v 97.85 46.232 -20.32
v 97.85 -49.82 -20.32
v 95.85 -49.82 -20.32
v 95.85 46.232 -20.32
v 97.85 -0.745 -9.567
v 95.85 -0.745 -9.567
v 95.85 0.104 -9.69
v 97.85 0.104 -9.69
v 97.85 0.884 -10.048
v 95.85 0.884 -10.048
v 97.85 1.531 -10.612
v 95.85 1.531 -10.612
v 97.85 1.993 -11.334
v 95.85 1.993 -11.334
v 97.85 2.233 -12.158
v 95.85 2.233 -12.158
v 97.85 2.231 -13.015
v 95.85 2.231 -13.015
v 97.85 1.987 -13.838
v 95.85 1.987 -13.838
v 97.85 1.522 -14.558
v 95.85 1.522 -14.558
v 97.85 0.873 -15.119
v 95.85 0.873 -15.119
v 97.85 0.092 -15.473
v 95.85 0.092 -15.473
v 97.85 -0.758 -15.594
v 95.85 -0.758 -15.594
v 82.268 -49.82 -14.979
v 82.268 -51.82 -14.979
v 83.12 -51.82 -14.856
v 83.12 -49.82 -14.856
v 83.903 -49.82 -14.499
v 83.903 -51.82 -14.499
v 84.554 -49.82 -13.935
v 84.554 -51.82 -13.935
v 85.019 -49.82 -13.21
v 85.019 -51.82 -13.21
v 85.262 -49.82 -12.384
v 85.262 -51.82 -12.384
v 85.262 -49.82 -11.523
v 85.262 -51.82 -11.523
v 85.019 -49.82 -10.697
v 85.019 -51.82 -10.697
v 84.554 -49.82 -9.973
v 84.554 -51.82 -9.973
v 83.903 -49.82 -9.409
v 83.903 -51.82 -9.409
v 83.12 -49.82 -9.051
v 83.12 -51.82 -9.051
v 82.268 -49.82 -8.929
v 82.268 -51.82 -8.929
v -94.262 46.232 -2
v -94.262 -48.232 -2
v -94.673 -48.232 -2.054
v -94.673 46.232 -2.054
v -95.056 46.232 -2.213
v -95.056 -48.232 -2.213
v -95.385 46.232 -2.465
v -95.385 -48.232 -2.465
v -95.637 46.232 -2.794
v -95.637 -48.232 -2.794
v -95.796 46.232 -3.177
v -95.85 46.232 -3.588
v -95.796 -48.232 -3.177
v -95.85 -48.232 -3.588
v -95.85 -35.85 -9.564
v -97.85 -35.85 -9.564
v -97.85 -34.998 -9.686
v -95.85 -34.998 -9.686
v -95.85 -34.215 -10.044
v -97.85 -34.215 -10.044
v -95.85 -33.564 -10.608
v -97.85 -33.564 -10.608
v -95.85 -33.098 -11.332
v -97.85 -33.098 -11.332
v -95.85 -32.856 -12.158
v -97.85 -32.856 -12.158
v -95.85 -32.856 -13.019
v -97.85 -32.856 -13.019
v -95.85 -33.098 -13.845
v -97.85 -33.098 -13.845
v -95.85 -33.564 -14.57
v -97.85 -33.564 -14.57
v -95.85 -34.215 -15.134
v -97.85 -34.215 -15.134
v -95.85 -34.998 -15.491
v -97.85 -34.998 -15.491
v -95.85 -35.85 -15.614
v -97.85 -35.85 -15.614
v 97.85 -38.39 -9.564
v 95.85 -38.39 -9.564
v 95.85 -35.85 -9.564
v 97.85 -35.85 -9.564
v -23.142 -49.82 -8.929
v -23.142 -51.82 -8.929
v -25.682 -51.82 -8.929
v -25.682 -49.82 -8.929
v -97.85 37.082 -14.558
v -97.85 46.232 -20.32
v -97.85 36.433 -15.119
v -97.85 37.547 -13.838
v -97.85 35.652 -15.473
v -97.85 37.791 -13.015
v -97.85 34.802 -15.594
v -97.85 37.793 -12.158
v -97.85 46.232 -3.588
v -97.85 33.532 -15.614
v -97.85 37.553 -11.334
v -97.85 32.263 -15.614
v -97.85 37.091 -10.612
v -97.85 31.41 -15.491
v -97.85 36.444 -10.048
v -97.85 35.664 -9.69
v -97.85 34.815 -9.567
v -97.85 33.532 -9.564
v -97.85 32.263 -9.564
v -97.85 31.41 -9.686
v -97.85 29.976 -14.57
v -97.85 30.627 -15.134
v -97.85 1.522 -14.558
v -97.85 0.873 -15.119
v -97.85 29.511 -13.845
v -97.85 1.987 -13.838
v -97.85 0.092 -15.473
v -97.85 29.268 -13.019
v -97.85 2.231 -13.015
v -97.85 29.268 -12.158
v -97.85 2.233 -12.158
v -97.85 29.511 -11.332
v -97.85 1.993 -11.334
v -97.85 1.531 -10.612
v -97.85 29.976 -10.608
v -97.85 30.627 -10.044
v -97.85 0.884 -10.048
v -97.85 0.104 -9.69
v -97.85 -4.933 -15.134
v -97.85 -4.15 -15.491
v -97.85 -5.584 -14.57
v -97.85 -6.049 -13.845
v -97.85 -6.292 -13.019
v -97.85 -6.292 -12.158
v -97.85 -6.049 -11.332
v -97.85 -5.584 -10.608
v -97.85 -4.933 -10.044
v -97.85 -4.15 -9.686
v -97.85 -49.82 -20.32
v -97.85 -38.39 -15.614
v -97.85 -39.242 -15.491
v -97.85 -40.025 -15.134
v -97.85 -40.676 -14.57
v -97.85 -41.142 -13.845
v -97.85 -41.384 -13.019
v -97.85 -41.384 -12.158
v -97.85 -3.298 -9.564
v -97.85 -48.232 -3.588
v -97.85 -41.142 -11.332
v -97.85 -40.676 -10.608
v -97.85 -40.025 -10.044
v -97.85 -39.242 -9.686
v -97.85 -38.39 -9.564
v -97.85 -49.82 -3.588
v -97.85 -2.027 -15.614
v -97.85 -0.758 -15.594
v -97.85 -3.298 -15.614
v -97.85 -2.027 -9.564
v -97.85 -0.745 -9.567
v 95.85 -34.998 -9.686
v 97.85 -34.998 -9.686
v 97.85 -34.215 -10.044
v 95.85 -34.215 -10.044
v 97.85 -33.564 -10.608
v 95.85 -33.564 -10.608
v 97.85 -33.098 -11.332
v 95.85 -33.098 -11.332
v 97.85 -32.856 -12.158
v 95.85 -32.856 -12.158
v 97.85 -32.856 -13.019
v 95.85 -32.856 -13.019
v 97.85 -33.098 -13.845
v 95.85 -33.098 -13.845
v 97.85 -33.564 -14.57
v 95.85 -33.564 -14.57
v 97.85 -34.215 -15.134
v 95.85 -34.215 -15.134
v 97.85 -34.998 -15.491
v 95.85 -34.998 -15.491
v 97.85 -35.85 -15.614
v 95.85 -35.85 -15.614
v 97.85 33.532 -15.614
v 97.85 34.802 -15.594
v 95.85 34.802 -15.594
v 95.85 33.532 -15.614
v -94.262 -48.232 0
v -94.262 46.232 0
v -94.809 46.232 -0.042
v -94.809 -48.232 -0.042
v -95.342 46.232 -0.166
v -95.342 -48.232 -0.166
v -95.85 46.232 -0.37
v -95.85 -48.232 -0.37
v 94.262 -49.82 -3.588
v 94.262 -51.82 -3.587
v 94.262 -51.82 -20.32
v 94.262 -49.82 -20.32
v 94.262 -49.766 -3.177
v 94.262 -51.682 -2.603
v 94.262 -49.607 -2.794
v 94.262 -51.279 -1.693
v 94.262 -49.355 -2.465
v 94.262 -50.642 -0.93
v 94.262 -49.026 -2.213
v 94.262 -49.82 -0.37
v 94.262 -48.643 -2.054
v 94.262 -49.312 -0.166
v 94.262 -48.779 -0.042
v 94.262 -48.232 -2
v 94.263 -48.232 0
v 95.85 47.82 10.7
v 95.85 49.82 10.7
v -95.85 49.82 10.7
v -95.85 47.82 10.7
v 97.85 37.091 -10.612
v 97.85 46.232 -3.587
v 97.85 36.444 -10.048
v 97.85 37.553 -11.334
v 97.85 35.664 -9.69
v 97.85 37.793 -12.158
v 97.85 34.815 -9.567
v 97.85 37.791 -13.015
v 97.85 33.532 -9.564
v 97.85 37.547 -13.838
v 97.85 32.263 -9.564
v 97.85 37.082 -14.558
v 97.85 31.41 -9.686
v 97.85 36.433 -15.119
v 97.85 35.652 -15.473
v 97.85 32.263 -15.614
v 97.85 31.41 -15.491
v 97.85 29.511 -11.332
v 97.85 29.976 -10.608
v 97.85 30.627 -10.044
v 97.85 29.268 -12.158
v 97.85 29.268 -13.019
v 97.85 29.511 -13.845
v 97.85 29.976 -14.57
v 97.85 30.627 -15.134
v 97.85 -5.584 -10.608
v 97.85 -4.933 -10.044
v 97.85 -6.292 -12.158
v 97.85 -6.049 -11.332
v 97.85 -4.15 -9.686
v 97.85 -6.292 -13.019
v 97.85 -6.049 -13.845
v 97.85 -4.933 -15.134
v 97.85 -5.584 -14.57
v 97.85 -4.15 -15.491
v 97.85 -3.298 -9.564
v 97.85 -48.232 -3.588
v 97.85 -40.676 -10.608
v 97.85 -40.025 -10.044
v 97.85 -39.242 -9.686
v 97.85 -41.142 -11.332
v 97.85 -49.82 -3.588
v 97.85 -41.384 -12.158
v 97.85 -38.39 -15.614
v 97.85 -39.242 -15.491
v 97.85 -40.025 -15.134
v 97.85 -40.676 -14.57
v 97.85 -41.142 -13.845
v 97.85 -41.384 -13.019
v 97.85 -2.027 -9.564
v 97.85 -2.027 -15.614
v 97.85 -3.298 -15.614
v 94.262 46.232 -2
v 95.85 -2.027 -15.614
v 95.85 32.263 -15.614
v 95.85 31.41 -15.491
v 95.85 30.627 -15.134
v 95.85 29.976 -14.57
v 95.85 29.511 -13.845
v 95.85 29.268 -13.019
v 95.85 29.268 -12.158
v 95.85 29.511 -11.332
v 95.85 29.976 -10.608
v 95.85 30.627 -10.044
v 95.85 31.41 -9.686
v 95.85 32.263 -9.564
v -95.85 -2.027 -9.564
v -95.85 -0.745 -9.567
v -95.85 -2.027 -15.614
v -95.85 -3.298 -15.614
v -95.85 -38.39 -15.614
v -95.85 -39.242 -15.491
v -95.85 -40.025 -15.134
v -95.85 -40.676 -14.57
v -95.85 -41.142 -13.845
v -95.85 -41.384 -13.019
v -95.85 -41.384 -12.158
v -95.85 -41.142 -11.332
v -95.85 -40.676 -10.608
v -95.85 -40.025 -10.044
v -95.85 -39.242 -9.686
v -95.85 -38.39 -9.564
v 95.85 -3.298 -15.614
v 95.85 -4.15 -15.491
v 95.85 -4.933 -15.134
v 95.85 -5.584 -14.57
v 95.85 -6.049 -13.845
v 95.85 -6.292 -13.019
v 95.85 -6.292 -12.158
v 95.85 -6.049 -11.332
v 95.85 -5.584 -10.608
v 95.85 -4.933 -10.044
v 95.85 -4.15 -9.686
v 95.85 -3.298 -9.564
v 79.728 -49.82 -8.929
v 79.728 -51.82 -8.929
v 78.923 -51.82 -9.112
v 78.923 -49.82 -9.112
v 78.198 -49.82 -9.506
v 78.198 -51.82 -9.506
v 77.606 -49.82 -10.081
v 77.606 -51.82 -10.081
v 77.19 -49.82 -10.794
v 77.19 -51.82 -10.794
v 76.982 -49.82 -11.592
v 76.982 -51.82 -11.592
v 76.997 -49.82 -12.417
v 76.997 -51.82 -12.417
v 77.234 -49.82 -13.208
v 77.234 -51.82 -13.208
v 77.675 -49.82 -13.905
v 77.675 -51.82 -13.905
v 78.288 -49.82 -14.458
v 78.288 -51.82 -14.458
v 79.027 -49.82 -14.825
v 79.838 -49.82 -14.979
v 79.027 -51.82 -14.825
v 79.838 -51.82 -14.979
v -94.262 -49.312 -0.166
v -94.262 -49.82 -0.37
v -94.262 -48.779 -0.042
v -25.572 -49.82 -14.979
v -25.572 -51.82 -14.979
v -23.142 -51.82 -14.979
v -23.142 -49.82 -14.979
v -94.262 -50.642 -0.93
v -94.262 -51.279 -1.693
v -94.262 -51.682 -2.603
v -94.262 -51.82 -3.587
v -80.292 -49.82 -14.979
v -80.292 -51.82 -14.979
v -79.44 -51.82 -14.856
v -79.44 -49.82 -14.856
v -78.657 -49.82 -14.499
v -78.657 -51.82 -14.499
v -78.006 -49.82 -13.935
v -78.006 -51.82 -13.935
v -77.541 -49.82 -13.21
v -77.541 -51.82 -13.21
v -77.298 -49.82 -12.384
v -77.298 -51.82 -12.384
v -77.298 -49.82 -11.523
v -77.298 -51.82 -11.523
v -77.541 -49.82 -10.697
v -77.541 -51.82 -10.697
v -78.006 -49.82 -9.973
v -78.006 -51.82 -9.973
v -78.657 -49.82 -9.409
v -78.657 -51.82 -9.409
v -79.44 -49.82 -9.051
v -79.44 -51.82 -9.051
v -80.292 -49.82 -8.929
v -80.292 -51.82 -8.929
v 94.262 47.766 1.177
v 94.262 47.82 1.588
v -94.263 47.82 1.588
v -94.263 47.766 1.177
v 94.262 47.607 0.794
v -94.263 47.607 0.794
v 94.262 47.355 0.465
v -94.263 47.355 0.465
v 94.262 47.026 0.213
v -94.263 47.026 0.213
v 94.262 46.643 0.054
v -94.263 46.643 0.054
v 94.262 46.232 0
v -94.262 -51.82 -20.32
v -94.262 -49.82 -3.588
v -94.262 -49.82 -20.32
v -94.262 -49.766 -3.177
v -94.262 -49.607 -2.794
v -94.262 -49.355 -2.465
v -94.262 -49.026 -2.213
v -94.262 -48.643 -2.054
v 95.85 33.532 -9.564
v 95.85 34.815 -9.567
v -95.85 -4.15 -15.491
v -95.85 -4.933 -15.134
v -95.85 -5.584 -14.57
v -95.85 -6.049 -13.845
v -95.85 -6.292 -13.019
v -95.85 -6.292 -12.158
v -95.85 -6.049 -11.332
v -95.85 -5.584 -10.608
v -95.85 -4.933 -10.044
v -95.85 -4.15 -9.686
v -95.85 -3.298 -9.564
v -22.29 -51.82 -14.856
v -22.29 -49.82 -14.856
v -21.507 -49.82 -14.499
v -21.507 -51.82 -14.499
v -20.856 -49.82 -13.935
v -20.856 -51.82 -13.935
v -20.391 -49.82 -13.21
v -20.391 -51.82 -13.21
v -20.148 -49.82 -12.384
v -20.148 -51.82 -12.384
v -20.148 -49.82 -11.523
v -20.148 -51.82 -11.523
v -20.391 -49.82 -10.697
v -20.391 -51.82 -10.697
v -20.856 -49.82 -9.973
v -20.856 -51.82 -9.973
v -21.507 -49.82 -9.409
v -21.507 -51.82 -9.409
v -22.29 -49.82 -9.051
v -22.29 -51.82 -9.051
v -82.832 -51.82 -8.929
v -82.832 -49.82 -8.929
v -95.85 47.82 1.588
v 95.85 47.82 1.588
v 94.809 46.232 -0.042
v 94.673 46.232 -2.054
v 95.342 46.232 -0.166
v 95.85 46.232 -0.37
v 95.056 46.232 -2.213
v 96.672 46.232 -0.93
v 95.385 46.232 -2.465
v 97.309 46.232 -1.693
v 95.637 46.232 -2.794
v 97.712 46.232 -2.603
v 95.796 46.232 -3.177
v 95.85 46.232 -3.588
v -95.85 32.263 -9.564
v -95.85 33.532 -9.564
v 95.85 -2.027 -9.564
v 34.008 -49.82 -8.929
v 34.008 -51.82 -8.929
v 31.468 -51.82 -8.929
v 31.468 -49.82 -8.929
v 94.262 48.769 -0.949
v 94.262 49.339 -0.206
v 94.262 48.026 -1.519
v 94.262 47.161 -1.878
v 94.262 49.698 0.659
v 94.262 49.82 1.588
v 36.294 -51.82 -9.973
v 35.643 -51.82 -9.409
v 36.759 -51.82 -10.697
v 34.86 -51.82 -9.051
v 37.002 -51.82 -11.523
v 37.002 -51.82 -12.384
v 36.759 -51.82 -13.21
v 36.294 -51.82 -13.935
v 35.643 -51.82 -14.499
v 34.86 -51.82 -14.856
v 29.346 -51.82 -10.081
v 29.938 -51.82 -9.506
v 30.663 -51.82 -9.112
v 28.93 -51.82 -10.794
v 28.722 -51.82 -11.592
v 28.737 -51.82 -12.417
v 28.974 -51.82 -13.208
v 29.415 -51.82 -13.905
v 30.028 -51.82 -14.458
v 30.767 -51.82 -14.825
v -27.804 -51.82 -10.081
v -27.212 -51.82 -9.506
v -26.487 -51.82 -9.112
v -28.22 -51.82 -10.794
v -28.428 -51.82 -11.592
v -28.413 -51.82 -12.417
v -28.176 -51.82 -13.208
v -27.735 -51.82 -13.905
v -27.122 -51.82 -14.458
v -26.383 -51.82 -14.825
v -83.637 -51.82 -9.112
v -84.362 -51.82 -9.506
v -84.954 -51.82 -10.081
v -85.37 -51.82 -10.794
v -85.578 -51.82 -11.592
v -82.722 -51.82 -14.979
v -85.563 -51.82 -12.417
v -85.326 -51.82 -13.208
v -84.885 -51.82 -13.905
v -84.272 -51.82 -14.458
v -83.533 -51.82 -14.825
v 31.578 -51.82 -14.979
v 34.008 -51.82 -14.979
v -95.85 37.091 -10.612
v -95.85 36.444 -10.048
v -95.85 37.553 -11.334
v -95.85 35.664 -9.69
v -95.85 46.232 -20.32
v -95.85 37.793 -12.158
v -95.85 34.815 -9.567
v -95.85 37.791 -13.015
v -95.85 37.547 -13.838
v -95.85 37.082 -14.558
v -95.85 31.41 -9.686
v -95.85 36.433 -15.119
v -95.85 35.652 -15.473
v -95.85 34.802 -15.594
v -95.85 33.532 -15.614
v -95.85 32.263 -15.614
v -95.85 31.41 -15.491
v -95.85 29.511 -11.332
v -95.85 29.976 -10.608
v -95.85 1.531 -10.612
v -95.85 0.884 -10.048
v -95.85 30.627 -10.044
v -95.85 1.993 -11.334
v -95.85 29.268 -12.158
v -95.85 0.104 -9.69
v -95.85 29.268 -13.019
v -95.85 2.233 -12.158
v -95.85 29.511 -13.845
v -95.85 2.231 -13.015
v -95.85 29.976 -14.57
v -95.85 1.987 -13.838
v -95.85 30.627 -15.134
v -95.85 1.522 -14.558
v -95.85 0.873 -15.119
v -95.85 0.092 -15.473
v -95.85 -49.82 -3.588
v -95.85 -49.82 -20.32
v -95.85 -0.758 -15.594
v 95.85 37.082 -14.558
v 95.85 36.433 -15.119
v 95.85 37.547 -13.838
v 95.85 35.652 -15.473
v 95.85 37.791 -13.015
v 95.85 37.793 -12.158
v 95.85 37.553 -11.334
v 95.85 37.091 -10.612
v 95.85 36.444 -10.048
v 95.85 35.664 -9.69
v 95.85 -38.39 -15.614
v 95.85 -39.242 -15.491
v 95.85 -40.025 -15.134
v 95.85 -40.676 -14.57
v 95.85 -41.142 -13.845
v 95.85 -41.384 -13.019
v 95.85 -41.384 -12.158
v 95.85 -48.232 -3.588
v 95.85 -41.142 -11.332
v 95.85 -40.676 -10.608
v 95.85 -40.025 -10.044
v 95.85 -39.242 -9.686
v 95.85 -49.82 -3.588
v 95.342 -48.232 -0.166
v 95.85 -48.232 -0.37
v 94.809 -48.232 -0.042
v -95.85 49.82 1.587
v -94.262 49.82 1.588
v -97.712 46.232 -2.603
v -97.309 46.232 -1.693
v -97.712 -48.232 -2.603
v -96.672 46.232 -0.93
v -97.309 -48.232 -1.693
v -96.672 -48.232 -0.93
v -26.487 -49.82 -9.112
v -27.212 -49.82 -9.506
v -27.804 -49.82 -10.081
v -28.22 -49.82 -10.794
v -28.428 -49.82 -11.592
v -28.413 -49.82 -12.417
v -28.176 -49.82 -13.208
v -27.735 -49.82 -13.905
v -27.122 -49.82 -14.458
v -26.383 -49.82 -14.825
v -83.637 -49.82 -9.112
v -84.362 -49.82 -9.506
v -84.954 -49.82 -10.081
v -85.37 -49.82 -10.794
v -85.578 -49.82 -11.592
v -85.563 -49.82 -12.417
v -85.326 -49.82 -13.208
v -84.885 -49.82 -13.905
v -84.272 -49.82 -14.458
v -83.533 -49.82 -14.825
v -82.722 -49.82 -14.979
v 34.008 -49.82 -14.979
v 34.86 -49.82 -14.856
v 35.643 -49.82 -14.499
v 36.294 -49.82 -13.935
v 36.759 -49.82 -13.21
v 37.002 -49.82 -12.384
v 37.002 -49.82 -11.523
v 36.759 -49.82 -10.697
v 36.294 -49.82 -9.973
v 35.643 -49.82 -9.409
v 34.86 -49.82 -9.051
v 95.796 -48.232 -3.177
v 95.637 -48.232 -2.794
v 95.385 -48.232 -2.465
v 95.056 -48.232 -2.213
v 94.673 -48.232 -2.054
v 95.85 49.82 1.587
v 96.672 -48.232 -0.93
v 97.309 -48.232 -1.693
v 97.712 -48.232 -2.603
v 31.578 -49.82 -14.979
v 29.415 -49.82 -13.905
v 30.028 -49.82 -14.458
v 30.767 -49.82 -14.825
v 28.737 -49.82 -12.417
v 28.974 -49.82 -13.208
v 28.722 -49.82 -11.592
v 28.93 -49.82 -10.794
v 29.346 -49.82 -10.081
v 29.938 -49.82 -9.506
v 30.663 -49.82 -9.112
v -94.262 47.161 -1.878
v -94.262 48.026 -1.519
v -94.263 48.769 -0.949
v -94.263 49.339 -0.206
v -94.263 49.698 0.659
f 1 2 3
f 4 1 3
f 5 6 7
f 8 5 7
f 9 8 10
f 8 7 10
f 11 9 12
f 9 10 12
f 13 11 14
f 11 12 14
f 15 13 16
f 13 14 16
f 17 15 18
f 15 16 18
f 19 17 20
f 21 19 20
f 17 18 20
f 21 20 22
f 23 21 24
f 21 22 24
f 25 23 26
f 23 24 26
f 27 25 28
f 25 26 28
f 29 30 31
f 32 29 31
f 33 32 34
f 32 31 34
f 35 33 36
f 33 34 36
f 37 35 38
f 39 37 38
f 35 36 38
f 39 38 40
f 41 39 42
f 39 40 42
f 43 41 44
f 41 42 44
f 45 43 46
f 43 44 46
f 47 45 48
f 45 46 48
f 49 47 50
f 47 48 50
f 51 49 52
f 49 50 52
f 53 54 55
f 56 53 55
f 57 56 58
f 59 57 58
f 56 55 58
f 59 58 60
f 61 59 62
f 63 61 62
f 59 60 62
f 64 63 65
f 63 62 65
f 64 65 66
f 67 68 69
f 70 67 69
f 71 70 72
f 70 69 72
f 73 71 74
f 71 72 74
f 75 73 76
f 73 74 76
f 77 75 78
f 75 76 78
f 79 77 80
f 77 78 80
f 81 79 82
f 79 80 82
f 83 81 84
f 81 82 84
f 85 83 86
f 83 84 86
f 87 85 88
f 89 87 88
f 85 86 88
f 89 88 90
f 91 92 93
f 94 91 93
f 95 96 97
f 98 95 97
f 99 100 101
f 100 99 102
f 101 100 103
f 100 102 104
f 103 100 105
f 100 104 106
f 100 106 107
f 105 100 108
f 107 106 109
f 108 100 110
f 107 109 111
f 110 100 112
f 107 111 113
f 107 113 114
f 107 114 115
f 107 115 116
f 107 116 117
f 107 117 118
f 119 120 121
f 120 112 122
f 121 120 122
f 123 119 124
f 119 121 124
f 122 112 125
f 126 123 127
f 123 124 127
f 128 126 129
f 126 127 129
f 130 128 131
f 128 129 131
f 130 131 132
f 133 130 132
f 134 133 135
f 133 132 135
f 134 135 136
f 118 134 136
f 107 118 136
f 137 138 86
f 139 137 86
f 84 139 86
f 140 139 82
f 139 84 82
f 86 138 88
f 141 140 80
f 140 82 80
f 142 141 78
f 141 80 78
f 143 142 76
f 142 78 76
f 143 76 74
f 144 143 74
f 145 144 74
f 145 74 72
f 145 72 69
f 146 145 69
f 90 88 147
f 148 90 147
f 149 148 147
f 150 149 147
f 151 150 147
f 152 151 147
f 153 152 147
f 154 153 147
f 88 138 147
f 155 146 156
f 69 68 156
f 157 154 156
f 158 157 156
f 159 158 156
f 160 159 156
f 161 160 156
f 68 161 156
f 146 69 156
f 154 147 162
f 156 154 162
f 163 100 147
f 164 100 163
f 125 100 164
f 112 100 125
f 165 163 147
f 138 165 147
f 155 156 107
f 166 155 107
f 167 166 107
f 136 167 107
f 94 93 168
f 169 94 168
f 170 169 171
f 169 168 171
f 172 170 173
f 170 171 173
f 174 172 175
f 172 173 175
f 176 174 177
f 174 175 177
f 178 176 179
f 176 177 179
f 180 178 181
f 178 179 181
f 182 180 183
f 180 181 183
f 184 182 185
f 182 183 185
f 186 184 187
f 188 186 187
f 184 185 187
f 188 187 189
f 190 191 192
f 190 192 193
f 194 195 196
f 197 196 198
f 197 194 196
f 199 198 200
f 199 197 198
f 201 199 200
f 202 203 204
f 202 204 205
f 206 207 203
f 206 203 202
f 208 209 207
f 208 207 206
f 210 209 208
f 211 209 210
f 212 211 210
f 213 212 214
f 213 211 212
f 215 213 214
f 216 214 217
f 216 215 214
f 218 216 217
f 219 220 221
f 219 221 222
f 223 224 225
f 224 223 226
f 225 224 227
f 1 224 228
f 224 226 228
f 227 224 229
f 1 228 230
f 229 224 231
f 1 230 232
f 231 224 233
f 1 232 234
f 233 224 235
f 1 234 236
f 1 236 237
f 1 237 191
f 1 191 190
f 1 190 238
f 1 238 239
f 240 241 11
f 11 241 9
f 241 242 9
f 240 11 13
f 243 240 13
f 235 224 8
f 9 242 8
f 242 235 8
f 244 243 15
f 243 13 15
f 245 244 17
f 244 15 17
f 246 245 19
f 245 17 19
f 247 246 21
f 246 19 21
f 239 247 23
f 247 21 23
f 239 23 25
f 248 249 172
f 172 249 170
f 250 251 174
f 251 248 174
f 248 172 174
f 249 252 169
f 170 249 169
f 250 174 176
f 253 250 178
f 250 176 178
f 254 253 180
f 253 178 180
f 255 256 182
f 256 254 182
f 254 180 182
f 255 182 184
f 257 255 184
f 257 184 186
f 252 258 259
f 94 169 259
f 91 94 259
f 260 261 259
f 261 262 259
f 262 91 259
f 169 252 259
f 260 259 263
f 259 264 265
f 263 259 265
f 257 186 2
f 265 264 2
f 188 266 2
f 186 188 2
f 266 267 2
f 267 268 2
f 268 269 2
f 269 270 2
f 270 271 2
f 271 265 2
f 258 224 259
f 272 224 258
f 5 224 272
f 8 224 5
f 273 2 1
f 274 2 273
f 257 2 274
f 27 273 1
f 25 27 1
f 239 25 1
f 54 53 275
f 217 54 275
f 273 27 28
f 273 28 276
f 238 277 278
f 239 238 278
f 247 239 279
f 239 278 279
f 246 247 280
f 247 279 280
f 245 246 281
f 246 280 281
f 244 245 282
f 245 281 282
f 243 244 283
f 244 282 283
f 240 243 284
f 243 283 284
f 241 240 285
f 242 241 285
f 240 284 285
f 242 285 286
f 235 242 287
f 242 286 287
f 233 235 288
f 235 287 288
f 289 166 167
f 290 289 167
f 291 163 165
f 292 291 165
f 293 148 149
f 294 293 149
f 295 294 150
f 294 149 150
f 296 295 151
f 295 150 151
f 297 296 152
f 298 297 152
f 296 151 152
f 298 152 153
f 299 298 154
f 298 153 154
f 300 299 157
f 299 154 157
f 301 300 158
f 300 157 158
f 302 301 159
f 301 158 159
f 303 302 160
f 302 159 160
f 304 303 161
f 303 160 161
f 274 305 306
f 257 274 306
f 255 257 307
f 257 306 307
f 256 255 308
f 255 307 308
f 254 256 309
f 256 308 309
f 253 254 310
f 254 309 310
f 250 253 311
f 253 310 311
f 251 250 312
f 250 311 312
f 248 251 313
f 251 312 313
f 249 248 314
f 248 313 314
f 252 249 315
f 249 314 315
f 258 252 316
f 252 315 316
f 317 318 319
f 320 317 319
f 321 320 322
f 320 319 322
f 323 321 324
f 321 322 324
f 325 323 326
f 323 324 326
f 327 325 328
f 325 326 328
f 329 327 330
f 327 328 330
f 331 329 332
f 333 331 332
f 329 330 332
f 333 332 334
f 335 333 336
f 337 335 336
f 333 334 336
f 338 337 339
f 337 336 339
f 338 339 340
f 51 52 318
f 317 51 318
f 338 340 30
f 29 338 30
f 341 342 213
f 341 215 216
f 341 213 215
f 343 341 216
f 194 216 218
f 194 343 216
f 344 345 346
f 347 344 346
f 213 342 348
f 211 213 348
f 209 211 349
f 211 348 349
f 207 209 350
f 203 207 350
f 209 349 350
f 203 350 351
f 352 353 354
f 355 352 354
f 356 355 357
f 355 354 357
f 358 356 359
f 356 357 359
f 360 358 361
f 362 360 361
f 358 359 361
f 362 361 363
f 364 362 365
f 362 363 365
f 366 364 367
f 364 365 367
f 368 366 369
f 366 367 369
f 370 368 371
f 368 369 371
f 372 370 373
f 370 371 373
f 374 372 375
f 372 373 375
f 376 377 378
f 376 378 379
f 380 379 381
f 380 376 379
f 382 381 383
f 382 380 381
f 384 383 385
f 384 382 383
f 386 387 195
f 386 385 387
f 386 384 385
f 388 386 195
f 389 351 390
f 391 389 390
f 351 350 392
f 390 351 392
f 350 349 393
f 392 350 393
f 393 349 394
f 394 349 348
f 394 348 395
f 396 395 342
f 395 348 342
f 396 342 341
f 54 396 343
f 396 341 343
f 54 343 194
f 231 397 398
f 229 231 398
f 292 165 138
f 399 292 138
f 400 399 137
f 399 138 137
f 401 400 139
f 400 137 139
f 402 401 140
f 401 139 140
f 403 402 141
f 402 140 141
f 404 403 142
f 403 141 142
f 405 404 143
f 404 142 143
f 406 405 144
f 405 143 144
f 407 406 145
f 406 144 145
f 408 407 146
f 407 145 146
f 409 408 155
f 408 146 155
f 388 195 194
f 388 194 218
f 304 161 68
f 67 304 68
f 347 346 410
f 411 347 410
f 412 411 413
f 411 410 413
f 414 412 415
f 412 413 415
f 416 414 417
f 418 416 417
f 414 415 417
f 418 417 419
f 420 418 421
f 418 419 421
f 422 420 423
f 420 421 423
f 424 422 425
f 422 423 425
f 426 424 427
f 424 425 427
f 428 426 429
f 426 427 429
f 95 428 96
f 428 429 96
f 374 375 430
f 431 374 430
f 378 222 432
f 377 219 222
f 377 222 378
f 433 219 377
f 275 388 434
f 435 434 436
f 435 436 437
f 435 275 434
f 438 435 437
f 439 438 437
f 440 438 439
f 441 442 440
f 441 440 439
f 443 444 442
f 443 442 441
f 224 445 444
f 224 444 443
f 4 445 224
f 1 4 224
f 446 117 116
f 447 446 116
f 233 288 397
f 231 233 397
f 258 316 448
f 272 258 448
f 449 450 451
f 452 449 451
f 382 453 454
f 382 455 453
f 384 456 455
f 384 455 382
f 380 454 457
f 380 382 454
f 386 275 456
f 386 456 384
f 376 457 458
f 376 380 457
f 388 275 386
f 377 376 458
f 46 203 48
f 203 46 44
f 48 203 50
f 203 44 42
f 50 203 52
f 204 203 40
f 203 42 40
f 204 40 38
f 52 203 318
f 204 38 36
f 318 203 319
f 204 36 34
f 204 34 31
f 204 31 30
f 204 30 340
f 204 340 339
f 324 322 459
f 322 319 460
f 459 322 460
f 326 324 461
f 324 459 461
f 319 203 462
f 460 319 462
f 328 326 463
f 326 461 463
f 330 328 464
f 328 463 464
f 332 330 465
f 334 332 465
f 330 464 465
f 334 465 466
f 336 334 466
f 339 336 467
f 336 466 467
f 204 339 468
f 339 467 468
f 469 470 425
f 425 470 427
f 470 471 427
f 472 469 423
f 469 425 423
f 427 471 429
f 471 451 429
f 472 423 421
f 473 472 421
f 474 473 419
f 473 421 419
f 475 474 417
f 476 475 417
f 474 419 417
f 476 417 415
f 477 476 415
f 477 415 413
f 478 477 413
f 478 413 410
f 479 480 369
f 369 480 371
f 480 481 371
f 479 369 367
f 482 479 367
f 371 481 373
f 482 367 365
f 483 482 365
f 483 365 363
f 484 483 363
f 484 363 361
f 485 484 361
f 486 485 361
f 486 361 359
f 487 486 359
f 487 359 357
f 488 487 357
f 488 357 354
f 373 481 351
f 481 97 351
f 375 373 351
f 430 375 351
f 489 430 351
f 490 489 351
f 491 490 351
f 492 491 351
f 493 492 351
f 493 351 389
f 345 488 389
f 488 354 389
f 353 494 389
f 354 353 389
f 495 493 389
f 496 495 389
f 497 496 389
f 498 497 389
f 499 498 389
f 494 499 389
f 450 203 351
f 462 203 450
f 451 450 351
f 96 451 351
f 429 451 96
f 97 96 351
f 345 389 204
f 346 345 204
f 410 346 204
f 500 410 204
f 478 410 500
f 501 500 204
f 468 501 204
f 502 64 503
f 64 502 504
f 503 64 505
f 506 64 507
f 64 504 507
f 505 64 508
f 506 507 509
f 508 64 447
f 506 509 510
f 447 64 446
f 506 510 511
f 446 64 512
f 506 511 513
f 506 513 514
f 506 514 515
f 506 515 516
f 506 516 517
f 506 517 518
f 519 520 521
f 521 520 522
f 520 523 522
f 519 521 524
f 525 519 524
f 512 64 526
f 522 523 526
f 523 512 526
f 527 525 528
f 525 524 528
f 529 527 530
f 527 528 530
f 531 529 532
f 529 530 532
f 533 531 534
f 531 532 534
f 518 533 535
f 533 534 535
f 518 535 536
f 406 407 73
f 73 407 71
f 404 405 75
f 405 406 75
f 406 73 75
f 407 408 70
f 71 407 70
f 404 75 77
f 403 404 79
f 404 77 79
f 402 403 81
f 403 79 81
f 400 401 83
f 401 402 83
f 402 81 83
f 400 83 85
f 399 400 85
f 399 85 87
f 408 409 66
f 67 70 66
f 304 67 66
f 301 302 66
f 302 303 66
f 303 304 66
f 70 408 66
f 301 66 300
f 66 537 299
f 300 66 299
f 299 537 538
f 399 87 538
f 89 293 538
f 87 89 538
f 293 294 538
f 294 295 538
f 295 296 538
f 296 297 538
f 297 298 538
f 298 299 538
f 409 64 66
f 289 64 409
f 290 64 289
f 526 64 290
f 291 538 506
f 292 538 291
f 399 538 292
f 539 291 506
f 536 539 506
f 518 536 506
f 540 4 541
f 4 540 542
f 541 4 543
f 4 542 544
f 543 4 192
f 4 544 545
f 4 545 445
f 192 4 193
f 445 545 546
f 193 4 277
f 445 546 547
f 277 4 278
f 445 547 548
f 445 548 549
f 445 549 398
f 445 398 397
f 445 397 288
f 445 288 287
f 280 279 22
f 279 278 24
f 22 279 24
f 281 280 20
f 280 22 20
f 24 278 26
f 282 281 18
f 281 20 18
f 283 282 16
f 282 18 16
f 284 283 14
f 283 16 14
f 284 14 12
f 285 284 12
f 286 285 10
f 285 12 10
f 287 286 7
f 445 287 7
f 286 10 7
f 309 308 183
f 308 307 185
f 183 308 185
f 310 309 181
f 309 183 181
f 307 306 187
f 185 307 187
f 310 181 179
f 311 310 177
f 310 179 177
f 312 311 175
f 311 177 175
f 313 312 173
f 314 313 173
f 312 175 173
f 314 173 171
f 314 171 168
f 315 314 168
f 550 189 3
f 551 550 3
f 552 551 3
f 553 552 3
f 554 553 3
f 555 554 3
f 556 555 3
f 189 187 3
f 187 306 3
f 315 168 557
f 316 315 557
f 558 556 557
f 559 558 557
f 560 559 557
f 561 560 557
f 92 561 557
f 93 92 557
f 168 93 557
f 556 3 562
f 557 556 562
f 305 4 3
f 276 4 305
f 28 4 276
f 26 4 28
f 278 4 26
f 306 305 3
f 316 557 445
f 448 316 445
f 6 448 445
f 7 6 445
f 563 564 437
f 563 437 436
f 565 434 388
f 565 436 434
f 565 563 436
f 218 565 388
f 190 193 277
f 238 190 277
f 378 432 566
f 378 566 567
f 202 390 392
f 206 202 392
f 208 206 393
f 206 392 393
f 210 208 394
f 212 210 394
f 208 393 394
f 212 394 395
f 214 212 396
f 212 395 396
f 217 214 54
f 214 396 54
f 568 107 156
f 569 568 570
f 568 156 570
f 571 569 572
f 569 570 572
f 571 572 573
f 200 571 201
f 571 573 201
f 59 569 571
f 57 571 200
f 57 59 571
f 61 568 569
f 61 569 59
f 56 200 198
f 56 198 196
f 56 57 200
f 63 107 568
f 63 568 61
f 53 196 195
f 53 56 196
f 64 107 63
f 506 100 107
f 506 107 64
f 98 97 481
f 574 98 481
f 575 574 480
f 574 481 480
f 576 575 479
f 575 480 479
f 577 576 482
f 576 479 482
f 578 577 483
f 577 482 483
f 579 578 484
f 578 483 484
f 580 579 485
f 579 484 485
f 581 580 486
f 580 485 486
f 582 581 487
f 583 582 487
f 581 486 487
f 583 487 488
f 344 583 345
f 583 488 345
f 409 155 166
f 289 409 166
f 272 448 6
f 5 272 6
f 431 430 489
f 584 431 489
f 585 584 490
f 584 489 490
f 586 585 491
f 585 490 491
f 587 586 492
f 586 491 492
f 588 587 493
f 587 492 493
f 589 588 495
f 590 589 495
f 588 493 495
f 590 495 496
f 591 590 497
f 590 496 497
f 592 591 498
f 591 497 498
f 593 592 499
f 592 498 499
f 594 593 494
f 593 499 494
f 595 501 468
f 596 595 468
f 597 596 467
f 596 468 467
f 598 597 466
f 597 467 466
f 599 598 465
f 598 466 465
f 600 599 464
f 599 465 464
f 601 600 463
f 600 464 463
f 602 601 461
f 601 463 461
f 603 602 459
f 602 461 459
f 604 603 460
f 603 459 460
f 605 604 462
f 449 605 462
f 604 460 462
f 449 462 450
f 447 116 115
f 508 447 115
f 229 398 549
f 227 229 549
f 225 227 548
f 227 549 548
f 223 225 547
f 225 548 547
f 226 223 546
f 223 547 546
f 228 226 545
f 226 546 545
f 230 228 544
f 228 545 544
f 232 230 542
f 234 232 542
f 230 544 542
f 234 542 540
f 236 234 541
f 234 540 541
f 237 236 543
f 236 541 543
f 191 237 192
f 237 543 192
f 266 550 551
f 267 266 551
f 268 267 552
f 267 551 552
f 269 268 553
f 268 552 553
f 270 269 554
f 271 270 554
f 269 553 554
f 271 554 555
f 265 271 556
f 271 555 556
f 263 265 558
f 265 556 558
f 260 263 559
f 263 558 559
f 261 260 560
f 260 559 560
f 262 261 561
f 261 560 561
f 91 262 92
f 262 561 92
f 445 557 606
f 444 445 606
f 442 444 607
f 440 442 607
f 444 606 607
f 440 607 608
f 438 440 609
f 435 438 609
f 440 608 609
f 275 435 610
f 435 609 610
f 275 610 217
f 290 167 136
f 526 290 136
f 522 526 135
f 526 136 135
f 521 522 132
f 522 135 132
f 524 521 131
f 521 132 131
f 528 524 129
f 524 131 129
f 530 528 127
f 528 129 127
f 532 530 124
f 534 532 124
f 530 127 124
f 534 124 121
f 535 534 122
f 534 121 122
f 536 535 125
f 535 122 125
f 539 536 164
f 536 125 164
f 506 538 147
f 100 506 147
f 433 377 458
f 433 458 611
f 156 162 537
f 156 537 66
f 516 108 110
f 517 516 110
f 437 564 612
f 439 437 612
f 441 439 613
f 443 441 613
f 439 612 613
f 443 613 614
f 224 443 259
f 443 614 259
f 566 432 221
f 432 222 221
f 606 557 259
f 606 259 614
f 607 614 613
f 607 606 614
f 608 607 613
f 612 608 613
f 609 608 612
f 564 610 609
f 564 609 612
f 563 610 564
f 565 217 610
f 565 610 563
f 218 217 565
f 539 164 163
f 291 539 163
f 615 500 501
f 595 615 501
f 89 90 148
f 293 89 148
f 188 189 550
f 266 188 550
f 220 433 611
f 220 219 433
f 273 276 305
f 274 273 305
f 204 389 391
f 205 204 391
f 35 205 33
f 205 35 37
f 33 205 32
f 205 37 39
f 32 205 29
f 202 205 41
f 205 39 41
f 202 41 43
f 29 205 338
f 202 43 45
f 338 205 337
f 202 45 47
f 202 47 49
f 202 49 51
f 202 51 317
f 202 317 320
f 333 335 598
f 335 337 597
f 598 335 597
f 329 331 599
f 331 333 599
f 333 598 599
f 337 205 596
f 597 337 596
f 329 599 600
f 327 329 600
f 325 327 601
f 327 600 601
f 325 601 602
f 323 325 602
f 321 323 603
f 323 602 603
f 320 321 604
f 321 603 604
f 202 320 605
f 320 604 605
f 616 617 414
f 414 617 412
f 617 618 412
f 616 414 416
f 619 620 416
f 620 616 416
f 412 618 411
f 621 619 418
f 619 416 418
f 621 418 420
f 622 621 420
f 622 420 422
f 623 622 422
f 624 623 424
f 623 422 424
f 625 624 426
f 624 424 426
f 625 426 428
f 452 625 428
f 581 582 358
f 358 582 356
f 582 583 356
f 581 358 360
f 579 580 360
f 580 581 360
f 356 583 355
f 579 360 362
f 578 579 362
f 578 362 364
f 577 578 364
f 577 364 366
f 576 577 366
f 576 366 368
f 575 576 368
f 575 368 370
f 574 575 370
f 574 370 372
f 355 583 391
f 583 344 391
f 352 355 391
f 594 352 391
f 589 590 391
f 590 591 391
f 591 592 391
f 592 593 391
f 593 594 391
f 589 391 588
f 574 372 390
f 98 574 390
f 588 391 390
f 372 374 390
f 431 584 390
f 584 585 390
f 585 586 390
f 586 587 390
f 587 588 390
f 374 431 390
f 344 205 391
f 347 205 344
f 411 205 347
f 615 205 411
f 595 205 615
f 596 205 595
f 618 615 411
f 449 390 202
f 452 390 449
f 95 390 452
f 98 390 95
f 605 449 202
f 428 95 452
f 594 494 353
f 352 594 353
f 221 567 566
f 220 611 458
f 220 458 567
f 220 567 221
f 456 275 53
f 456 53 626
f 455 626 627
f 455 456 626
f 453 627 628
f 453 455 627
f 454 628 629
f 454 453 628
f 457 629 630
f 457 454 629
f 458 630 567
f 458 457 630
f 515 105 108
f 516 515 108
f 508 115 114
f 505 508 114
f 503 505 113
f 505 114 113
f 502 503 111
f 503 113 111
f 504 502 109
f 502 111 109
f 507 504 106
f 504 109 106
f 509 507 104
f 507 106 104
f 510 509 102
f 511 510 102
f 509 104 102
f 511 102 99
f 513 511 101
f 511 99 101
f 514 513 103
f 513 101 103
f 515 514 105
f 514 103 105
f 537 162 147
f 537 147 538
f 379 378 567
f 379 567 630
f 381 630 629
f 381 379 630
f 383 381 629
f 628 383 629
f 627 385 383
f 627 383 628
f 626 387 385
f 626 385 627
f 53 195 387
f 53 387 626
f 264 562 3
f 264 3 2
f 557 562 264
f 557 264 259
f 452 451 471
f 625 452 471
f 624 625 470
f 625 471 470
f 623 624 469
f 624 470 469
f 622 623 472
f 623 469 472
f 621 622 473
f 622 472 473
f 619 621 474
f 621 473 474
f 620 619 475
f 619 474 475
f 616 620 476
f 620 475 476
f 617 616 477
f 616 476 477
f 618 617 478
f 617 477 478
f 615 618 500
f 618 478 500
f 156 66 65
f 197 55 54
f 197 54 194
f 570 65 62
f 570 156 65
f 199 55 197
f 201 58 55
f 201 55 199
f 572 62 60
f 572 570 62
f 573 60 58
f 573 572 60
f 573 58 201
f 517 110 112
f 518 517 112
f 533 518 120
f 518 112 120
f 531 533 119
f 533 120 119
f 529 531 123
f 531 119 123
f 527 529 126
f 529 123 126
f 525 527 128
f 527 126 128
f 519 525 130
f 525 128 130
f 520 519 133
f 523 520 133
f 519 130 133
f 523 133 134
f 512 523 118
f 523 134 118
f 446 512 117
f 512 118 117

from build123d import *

# Parameters (mm, degrees)
SKETCH1_W                    = 191.7
SKETCH1_H                    = 99.64
BASE_FLANGE4_DEPTH           = 2
EDGE_FLANGE2_STRIP_W         = 11.175
EDGE_FLANGE2_STRIP_H         = 2
EDGE_FLANGE2_STRIP_CUT_DEPTH = 191.7
EDGE_FLANGE2_DEPTH           = 191.7
EDGE_FLANGE1_START           = -49.82
EDGE_FLANGE1_DEPTH           = 99.64
EDGE_FLANGE1_START_2         = 46.2325
EDGE_FLANGE1_2_DEPTH         = 3.5875
EDGE_FLANGE1_3_DEPTH         = 96.0525
EDGE_FLANGE3_START           = -97.85
EDGE_FLANGE3_DEPTH           = 195.7
EDGE_FLANGE3_2_DEPTH         = 3.5875
EDGE_FLANGE3_START_2         = 94.2625
EDGE_FLANGE3_3_DEPTH         = 3.5875
EDGE_FLANGE3_START_3         = -94.2625
EDGE_FLANGE3_4_DEPTH         = 188.525
CUT_EXTRUDE1_DEPTH           = 204.46180182
CUT_EXTRUDE2_DEPTH           = 3.175


# Read off the part's stored shape, not the designer's step: Edge-Flange1, Edge-Flange3
# Sheet-metal steps are written as plain solids
with BuildPart() as part:
    # Sketch1 → Base-Flange4 (new body)
    with BuildSketch(Plane.XY):
        Rectangle(SKETCH1_W, SKETCH1_H)
    extrude(amount=-BASE_FLANGE4_DEPTH)

    # Edge-Flange2 strip (across the edge) → Edge-Flange2 strip cut (cut)
    with BuildSketch(Plane(origin=(95.85, 49.82, 0), x_dir=(0, -1, 0), z_dir=(-1, 0, 0))):
        with Locations((-2, -1)):
            Rectangle(EDGE_FLANGE2_STRIP_W, EDGE_FLANGE2_STRIP_H)
    extrude(amount=EDGE_FLANGE2_STRIP_CUT_DEPTH, mode=Mode.SUBTRACT)

    # Edge-Flange2 section (across the edge) → Edge-Flange2 (add)
    with BuildSketch(Plane(origin=(95.85, 49.82, 0), x_dir=(0, -1, 0), z_dir=(-1, 0, 0))):
        with BuildLine():
            Line((0, 1.5875), (0, 10.7))
            Line((0, 10.7), (2, 10.7))
            Line((2, 10.7), (2, 1.5875))
            ThreePointArc((2, 1.5875), (2.464967985, 0.464967985), (3.5875, 0))
            Line((3.5875, 0), (3.5875, -2))
            ThreePointArc((3.5875, -2), (1.050754422, -0.949245578), (0, 1.5875))
        make_face()
    extrude(amount=EDGE_FLANGE2_DEPTH)

    # Edge-Flange1 outline → Edge-Flange1 (cut)
    with BuildSketch(Plane(origin=(0, 0, 0), x_dir=(1, 0, 0), z_dir=(0, 1, 0)).offset(EDGE_FLANGE1_START)):
        with BuildLine():
            Line((94.2625, -1.5875), (95.85, -1.5875))
            Line((95.85, -1.5875), (95.85, 0.370358411))
            ThreePointArc((95.85, 0.370358411), (95.07756466, 0.093816292), (94.2625, 0))
            Line((94.2625, 0), (94.2625, -1.5875))
        make_face()
        with BuildLine():
            Line((-95.85, 0.370358411), (-95.85, -1.5875))
            Line((-95.85, -1.5875), (-94.2625, -1.5875))
            Line((-94.2625, -1.5875), (-94.2625, 0))
            ThreePointArc((-94.2625, 0), (-95.07756466, 0.093816292), (-95.85, 0.370358411))
        make_face()
    extrude(amount=EDGE_FLANGE1_DEPTH, mode=Mode.SUBTRACT)

    # Edge-Flange1 2 outline → Edge-Flange1 2 (cut)
    with BuildSketch(Plane(origin=(0, 0, 0), x_dir=(1, 0, 0), z_dir=(0, 1, 0)).offset(EDGE_FLANGE1_START_2)):
        with BuildLine():
            Line((94.2625, 2), (94.2625, 0))
            ThreePointArc((94.2625, 0), (95.07756466, 0.093816292), (95.85, 0.370358411))
            ThreePointArc((95.85, 0.370358411), (97.30924519, 1.693430307), (97.85, 3.5875))
            Line((97.85, 3.5875), (97.85, 20.32))
            Line((97.85, 20.32), (95.85, 20.32))
            Line((95.85, 20.32), (95.85, 3.5875))
            ThreePointArc((95.85, 3.5875), (95.385032015, 2.464967985), (94.2625, 2))
        make_face()
        with BuildLine():
            ThreePointArc((-95.85, 0.370358411), (-95.07756466, 0.093816292), (-94.2625, 0))
            Line((-94.2625, 0), (-94.2625, 2))
            ThreePointArc((-94.2625, 2), (-95.385032015, 2.464967985), (-95.85, 3.5875))
            Line((-95.85, 3.5875), (-95.85, 20.32))
            Line((-95.85, 20.32), (-97.85, 20.32))
            Line((-97.85, 20.32), (-97.85, 3.5875))
            ThreePointArc((-97.85, 3.5875), (-97.30924519, 1.693430307), (-95.85, 0.370358411))
        make_face()
    extrude(amount=EDGE_FLANGE1_2_DEPTH, mode=Mode.SUBTRACT)

    # Edge-Flange1 3 outline → Edge-Flange1 3 (add)
    with BuildSketch(Plane(origin=(0, 0, 0), x_dir=(1, 0, 0), z_dir=(0, 1, 0)).offset(EDGE_FLANGE1_START)):
        with BuildLine():
            Line((94.2625, 2), (94.2625, 0))
            ThreePointArc((94.2625, 0), (95.07756466, 0.093816292), (95.85, 0.370358411))
            ThreePointArc((95.85, 0.370358411), (97.30924519, 1.693430307), (97.85, 3.5875))
            Line((97.85, 3.5875), (97.85, 20.32))
            Line((97.85, 20.32), (95.85, 20.32))
            Line((95.85, 20.32), (95.85, 3.5875))
            ThreePointArc((95.85, 3.5875), (95.385032015, 2.464967985), (94.2625, 2))
        make_face()
        with BuildLine():
            ThreePointArc((-95.85, 0.370358411), (-95.07756466, 0.093816292), (-94.2625, 0))
            Line((-94.2625, 0), (-94.2625, 2))
            ThreePointArc((-94.2625, 2), (-95.385032015, 2.464967985), (-95.85, 3.5875))
            Line((-95.85, 3.5875), (-95.85, 20.32))
            Line((-95.85, 20.32), (-97.85, 20.32))
            Line((-97.85, 20.32), (-97.85, 3.5875))
            ThreePointArc((-97.85, 3.5875), (-97.30924519, 1.693430307), (-95.85, 0.370358411))
        make_face()
    extrude(amount=EDGE_FLANGE1_3_DEPTH)

    # Edge-Flange3 outline → Edge-Flange3 (cut)
    with BuildSketch(Plane.YZ.offset(EDGE_FLANGE3_START)):
        with BuildLine():
            ThreePointArc((-48.2325, -2), (-49.355032015, -2.464967985), (-49.82, -3.5875))
            Line((-49.82, -3.5875), (-48.2325, -3.5875))
            Line((-48.2325, -3.5875), (-48.2325, -2))
        make_face()
        with BuildLine():
            ThreePointArc((-49.82, -0.370358411), (-49.04756466, -0.093816292), (-48.2325, 0))
            Line((-48.2325, 0), (-49.82, 0))
            Line((-49.82, 0), (-49.82, -0.370358411))
        make_face()
    extrude(amount=EDGE_FLANGE3_DEPTH, mode=Mode.SUBTRACT)

    # Edge-Flange3 2 outline → Edge-Flange3 2 (cut)
    with BuildSketch(Plane.YZ.offset(EDGE_FLANGE3_START)):
        with BuildLine():
            ThreePointArc((-49.82, -3.5875), (-49.355032015, -2.464967985), (-48.2325, -2))
            Line((-48.2325, -2), (-48.2325, 0))
            ThreePointArc((-48.2325, 0), (-49.04756466, -0.093816292), (-49.82, -0.370358411))
            Line((-49.82, -0.370358411), (-49.82, -3.5875))
        make_face()
    extrude(amount=EDGE_FLANGE3_2_DEPTH, mode=Mode.SUBTRACT)

    # Edge-Flange3 3 outline → Edge-Flange3 3 (cut)
    with BuildSketch(Plane.YZ.offset(EDGE_FLANGE3_START_2)):
        with BuildLine():
            ThreePointArc((-49.82, -3.5875), (-49.355032015, -2.464967985), (-48.2325, -2))
            Line((-48.2325, -2), (-48.2325, 0))
            ThreePointArc((-48.2325, 0), (-49.04756466, -0.093816292), (-49.82, -0.370358411))
            Line((-49.82, -0.370358411), (-49.82, -3.5875))
        make_face()
    extrude(amount=EDGE_FLANGE3_3_DEPTH, mode=Mode.SUBTRACT)

    # Edge-Flange3 4 outline → Edge-Flange3 4 (add)
    with BuildSketch(Plane.YZ.offset(EDGE_FLANGE3_START_3)):
        with BuildLine():
            Line((-48.2325, -2), (-49.82, -2))
            Line((-49.82, -2), (-49.82, -0.370358411))
            ThreePointArc((-49.82, -0.370358411), (-51.27924519, -1.693430307), (-51.82, -3.5875))
            Line((-51.82, -3.5875), (-51.82, -20.32))
            Line((-51.82, -20.32), (-49.82, -20.32))
            Line((-49.82, -20.32), (-49.82, -3.5875))
            ThreePointArc((-49.82, -3.5875), (-49.355032015, -2.464967985), (-48.2325, -2))
        make_face()
    extrude(amount=EDGE_FLANGE3_4_DEPTH)

    # Sketch42 → Cut-Extrude1 (cut, through all)
    with BuildSketch(Plane.ZY.offset(97.85)):
        with BuildLine():
            ThreePointArc((-9.566529979, 34.815400328), (-12.586590694, 37.822400713), (-15.593591079, 34.802339997))
            Line((-15.593591079, 34.802339997), (-15.61375, 33.5325))
            Line((-15.61375, 33.5325), (-15.61375, 32.2625))
            ThreePointArc((-15.61375, 32.2625), (-12.58875, 29.2375), (-9.56375, 32.2625))
            Line((-9.56375, 32.2625), (-9.56375, 33.5325))
            Line((-9.56375, 33.5325), (-9.566529979, 34.815400328))
        make_face()
        with BuildLine():
            Line((-15.61375, -35.85), (-15.61375, -38.39))
            ThreePointArc((-15.61375, -38.39), (-12.58875, -41.415), (-9.56375, -38.39))
            Line((-9.56375, -38.39), (-9.56375, -35.85))
            ThreePointArc((-9.56375, -35.85), (-12.58875, -32.825), (-15.61375, -35.85))
        make_face()
        with BuildLine():
            Line((-9.56375, -3.2975), (-9.56375, -2.0275))
            Line((-9.56375, -2.0275), (-9.566529979, -0.744599672))
            ThreePointArc((-9.566529979, -0.744599672), (-12.586590694, 2.262400713), (-15.593591079, -0.757660003))
            Line((-15.593591079, -0.757660003), (-15.61375, -2.0275))
            Line((-15.61375, -2.0275), (-15.61375, -3.2975))
            ThreePointArc((-15.61375, -3.2975), (-12.58875, -6.3225), (-9.56375, -3.2975))
        make_face()
    extrude(amount=-CUT_EXTRUDE1_DEPTH, mode=Mode.SUBTRACT)

    # Sketch43 → Cut-Extrude2 (cut)
    with BuildSketch(Plane.XZ.offset(51.82)):
        with BuildLine():
            Line((-23.1425, -8.92875), (-25.6825, -8.92875))
            ThreePointArc((-25.6825, -8.92875), (-28.448425456, -12.005254825), (-25.572047177, -14.97875))
            Line((-25.572047177, -14.97875), (-23.1425, -14.97875))
            ThreePointArc((-23.1425, -14.97875), (-20.1175, -11.95375), (-23.1425, -8.92875))
        make_face()
        with BuildLine():
            Line((34.0075, -8.92875), (31.4675, -8.92875))
            ThreePointArc((31.4675, -8.92875), (28.701574544, -12.005254825), (31.577952823, -14.97875))
            Line((31.577952823, -14.97875), (34.0075, -14.97875))
            ThreePointArc((34.0075, -14.97875), (37.0325, -11.95375), (34.0075, -8.92875))
        make_face()
        with BuildLine():
            ThreePointArc((-80.2925, -14.97875), (-77.2675, -11.95375), (-80.2925, -8.92875))
            Line((-80.2925, -8.92875), (-82.8325, -8.92875))
            ThreePointArc((-82.8325, -8.92875), (-85.598425456, -12.005254825), (-82.722047177, -14.97875))
            Line((-82.722047177, -14.97875), (-80.2925, -14.97875))
        make_face()
        with BuildLine():
            Line((82.2675, -8.92875), (79.7275, -8.92875))
            ThreePointArc((79.7275, -8.92875), (76.961574544, -12.005254825), (79.837952823, -14.97875))
            Line((79.837952823, -14.97875), (82.2675, -14.97875))
            ThreePointArc((82.2675, -14.97875), (85.2925, -11.95375), (82.2675, -8.92875))
        make_face()
    extrude(amount=-CUT_EXTRUDE2_DEPTH, mode=Mode.SUBTRACT)


solid = part.part
